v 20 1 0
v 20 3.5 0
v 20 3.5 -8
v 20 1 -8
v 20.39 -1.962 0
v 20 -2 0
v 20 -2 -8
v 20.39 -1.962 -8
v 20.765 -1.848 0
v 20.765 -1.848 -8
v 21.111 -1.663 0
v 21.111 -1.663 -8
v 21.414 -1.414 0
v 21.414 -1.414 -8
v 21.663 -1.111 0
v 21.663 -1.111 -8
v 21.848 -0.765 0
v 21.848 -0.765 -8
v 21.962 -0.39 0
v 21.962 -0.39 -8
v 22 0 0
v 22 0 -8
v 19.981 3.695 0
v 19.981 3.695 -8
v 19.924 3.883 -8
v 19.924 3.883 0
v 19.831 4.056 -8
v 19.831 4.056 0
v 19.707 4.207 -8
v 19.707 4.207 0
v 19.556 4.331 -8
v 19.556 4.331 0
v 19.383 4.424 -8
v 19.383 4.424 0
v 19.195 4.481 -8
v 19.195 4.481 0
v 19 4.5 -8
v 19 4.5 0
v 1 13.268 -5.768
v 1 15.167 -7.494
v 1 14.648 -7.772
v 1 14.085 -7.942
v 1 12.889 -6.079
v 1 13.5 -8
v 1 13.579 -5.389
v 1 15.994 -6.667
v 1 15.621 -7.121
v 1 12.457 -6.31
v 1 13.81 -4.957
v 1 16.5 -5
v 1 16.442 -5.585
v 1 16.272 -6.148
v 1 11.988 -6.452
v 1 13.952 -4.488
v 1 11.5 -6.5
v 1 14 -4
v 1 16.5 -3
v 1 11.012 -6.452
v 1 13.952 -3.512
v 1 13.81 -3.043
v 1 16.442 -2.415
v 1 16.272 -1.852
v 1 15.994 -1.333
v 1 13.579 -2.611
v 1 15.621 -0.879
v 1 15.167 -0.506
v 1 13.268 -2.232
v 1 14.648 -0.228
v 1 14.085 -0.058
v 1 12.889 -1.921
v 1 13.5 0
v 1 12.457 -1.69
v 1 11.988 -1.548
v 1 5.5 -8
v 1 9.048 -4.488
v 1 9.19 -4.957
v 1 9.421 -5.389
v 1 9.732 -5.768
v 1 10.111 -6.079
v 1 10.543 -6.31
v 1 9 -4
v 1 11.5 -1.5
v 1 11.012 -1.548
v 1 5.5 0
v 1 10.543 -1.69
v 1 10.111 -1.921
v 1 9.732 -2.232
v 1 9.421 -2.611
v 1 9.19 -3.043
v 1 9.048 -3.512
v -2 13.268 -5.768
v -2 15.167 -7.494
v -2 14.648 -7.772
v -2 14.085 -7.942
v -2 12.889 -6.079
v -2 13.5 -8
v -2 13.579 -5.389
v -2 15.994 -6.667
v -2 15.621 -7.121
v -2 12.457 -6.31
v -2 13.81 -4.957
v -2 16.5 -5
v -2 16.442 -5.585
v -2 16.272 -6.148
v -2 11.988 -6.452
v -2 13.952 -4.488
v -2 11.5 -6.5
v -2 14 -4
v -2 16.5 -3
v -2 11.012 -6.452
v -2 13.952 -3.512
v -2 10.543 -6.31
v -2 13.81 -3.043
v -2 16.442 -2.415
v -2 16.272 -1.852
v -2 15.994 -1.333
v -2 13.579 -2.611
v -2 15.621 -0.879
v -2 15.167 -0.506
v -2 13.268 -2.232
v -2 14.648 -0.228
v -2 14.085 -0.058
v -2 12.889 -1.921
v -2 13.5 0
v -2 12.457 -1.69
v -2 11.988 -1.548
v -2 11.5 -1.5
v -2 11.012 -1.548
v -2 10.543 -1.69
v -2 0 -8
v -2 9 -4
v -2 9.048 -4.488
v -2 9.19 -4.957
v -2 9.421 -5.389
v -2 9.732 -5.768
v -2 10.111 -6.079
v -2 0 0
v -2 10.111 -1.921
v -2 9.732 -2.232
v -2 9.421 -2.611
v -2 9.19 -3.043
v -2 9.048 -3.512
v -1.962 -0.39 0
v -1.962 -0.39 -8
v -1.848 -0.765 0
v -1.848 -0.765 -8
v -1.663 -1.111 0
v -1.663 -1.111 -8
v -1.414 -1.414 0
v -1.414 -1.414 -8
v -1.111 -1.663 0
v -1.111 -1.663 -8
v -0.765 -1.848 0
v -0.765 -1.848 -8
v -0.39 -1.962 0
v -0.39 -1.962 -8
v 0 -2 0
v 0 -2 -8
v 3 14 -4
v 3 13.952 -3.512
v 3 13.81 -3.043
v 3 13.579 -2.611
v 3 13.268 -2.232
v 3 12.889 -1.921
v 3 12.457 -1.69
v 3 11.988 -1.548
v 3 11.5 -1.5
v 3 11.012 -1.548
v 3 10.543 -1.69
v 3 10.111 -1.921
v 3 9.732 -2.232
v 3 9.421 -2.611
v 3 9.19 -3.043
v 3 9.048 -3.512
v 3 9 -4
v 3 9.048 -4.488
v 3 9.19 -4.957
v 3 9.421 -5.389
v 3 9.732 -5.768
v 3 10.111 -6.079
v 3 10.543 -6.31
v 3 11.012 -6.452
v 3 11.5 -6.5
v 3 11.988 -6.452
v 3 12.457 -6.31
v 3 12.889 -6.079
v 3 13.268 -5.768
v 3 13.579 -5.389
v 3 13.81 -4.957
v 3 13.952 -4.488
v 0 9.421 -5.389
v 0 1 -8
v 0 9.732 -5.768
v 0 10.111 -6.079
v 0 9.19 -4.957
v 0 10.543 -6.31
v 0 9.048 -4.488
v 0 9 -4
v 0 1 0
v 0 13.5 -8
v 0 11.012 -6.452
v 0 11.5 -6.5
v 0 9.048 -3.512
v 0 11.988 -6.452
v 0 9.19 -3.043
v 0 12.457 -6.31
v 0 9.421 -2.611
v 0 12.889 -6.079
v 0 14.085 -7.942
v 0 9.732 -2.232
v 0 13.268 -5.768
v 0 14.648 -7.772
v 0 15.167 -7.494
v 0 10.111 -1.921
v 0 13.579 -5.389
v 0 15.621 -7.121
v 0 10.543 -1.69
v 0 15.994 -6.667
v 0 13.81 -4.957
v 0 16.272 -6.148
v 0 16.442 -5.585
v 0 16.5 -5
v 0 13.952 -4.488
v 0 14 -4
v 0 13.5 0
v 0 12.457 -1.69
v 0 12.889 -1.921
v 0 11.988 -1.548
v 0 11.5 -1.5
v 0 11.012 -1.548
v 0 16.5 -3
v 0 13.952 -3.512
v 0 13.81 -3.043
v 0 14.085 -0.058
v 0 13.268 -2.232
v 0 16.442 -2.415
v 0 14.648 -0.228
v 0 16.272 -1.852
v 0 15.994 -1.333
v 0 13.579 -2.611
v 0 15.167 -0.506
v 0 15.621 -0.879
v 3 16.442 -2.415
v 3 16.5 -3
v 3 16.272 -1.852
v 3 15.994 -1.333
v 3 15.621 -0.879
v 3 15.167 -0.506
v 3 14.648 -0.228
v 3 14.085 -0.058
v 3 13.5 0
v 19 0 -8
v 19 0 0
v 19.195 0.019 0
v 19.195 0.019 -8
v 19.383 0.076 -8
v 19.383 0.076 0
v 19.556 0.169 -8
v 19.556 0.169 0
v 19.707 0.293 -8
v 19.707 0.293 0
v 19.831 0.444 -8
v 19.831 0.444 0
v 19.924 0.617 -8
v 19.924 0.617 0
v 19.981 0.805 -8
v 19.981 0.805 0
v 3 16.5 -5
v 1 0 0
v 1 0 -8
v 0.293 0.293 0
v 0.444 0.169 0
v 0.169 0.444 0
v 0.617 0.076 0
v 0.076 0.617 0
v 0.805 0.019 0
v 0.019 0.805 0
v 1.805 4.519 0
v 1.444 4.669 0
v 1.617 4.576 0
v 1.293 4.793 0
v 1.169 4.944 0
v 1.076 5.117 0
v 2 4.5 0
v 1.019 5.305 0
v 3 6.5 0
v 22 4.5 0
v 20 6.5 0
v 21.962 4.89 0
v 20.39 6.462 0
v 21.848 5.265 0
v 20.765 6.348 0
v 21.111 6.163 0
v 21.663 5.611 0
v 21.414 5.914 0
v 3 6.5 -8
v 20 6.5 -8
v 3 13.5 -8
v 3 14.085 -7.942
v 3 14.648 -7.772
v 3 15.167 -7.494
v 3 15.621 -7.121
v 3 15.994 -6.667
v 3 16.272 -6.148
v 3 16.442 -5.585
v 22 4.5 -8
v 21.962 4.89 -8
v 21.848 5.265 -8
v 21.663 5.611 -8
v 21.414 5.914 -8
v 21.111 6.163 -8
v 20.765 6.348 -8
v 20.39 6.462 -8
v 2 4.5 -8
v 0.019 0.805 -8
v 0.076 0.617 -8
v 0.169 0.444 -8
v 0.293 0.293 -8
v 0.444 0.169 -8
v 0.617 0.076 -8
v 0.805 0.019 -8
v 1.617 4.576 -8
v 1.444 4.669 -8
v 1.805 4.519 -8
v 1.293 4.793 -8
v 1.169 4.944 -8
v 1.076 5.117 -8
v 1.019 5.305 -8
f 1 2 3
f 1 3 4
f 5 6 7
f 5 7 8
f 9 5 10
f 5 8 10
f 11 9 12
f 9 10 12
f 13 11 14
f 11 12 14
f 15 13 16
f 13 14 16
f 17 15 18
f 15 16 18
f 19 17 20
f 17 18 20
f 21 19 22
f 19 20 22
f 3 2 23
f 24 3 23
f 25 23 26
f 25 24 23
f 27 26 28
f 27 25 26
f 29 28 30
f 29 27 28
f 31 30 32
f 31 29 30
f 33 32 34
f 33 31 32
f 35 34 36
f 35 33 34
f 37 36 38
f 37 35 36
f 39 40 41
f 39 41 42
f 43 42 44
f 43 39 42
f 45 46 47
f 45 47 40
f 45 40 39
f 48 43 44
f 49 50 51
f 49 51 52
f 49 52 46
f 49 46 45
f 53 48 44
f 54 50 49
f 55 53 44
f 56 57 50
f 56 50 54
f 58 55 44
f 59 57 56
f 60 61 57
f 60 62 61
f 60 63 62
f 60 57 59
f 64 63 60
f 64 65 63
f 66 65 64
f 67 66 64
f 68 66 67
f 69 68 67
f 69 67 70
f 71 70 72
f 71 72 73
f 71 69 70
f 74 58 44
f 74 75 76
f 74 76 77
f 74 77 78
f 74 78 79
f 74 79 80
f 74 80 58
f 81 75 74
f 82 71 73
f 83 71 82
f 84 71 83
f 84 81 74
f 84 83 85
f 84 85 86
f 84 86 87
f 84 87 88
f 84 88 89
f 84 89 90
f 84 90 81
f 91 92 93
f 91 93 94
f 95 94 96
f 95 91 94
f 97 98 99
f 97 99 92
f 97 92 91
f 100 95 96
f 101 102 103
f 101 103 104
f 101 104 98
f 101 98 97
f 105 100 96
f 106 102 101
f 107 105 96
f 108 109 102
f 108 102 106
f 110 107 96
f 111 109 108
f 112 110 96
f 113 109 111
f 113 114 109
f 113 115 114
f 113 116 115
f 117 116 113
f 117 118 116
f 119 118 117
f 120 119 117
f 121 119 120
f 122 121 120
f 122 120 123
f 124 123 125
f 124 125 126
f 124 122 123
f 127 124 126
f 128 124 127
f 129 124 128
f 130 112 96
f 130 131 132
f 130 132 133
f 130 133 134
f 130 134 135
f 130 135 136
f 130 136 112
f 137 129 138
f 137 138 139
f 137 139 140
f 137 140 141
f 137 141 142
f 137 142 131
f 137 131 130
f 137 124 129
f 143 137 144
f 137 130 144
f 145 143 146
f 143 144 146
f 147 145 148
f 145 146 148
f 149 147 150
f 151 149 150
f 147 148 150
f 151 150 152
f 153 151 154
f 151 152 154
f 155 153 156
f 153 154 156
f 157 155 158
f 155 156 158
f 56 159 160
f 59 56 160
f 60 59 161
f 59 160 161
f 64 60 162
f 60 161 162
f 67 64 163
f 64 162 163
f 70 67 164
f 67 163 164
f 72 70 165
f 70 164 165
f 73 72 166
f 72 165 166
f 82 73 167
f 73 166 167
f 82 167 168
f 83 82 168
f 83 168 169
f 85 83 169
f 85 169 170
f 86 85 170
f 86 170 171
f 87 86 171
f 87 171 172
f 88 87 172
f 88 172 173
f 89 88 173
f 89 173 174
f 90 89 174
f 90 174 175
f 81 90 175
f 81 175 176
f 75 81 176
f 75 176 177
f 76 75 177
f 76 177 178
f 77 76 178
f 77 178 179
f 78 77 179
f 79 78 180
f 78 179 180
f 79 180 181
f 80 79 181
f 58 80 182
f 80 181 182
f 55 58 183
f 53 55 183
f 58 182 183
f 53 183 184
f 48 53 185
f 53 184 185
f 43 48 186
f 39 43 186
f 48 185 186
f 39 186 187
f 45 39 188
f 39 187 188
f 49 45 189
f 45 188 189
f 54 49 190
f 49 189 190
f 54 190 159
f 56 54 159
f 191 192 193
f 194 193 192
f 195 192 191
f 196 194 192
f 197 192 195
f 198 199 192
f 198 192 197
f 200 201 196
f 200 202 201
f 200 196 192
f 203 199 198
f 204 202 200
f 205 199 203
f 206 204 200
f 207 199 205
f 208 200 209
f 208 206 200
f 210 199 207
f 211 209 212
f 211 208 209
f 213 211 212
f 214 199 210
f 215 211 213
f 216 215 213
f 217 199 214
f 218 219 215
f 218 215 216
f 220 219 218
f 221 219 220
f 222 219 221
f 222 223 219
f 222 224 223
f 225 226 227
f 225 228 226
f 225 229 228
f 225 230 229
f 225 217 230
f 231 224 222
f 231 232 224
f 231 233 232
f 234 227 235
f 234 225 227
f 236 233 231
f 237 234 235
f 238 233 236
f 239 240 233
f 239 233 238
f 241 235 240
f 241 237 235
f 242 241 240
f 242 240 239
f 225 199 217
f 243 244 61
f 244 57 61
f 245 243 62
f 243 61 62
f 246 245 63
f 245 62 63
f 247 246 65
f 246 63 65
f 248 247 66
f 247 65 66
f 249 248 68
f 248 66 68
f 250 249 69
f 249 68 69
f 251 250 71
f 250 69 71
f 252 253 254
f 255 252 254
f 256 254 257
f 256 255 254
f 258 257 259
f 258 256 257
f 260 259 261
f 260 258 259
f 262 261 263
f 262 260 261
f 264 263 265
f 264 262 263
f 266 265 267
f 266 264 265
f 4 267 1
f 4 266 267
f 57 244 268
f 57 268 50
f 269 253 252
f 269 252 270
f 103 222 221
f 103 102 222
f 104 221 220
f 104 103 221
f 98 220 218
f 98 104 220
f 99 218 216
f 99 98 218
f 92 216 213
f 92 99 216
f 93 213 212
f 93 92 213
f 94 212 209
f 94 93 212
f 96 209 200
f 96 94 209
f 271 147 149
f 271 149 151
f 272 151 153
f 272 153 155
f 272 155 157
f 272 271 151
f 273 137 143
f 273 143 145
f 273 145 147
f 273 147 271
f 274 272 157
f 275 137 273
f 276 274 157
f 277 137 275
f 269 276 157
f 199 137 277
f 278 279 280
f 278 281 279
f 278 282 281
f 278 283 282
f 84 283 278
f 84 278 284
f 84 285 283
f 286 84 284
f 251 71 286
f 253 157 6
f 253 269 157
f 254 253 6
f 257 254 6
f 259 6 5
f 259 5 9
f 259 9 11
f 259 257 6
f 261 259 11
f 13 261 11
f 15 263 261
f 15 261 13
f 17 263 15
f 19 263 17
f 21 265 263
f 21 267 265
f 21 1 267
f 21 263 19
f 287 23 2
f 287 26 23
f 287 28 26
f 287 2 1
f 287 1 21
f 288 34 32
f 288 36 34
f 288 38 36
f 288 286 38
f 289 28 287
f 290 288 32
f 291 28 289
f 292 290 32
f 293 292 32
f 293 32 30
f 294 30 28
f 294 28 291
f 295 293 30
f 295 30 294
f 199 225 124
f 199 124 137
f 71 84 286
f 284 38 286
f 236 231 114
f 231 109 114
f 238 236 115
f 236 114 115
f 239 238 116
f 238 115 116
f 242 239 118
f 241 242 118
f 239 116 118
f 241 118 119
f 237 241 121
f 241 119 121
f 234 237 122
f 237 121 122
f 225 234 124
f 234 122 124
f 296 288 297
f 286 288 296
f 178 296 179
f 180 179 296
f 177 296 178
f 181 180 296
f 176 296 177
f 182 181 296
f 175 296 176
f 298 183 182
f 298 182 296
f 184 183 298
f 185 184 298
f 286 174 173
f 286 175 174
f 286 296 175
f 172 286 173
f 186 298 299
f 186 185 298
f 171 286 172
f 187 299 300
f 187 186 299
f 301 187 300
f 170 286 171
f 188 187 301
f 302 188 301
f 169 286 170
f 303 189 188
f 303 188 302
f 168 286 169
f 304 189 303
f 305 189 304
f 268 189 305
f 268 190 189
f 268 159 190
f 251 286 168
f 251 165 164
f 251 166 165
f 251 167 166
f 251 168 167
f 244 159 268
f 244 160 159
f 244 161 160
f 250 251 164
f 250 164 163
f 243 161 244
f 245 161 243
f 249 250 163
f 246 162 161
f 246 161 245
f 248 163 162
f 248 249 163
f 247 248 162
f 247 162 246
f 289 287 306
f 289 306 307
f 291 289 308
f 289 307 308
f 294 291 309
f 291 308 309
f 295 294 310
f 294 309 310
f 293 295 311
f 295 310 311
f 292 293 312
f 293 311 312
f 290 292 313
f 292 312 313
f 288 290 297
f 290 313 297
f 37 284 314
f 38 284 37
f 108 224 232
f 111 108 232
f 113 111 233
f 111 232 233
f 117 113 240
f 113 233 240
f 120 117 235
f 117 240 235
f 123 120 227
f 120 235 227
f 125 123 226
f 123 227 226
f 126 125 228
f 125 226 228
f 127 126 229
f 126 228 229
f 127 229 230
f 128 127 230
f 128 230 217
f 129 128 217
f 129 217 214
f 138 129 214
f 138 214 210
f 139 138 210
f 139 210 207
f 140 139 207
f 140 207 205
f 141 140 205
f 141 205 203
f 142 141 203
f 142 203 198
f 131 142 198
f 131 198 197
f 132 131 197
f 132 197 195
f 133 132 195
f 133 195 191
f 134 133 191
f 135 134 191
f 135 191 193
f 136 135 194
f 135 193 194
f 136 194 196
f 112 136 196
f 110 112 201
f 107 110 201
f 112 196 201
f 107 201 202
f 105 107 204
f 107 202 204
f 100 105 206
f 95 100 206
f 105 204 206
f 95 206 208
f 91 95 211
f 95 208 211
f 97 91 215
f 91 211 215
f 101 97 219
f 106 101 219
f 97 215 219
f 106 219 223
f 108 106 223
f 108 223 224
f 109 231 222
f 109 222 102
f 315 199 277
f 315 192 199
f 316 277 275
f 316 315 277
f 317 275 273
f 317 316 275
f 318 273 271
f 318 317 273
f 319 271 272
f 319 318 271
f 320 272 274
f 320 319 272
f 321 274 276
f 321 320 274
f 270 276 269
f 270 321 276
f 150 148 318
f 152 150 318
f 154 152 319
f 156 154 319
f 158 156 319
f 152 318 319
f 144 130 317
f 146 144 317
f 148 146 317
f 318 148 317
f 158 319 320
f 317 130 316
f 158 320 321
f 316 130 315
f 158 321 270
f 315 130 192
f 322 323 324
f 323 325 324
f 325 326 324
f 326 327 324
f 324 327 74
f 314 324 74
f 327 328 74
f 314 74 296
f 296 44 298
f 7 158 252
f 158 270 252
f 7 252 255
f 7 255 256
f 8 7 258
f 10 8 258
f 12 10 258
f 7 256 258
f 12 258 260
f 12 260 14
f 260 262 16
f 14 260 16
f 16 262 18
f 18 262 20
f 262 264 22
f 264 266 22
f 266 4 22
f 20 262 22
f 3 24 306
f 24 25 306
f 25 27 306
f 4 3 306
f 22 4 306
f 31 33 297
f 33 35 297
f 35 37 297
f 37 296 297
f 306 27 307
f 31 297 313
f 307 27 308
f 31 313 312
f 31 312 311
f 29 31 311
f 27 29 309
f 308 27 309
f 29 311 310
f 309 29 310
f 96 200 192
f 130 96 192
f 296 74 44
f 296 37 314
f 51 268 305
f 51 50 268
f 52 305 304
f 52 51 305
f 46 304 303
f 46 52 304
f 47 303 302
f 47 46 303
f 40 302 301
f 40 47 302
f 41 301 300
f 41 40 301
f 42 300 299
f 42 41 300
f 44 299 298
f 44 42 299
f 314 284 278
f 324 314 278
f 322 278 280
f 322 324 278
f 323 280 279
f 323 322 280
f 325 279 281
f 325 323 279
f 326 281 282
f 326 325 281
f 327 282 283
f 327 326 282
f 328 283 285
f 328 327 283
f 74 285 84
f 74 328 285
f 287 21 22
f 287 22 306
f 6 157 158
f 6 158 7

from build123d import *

# Parameters (mm, degrees)
F1_DEPTH = 8
F3_R     = 3
F2_R     = 2.5
F4_DEPTH = 5.001
F5_R     = 2
F6_R     = 1


# Not quite as in the source:
# - a feature names something its author has since deleted; it is built from what else it names


with BuildPart() as f1:
    # F0 (on Top) → F1 (new body)
    with BuildSketch(Plane.XY):
        Polygon((0, 0), (0, 16.5), (-2, 16.5), (-2, -2), (22, -2), (22, 6.5), (3, 6.5), (3, 16.5), (1, 16.5), (1, 4.5), (20, 4.5), (20, 0), align=None)
    extrude(amount=-F1_DEPTH)

    # F3
    f3_edges = [f1.edges().sort_by_distance(p)[0] for p in [
        (-1, 16.5, 0),
        (-1, 16.5, -8),
        (2, 16.5, 0),
        (2, 16.5, -8),
    ]]
    fillet(f3_edges, radius=F3_R)

    # F2 (on face) → F4 (cut, through all)
    with BuildSketch(Plane.YZ.offset(3)):
        with Locations((11.5, -4)):
            Circle(F2_R)
    extrude(amount=-F4_DEPTH, mode=Mode.SUBTRACT)

    # F5
    f5_edges = [f1.edges().sort_by_distance(p)[0] for p in [
        (22, 6.5, -4),
        (22, -2, -4),
        (-2, -2, -4),
    ]]
    fillet(f5_edges, radius=F5_R)

    # F6
    f6_edges = [f1.edges().sort_by_distance(p)[0] for p in [
        (20, 4.5, -4),
        (20, 0, -4),
        (0, 0, -4),
        (1, 4.5, -4),
    ]]
    fillet(f6_edges, radius=F6_R)


solid = f1.part
